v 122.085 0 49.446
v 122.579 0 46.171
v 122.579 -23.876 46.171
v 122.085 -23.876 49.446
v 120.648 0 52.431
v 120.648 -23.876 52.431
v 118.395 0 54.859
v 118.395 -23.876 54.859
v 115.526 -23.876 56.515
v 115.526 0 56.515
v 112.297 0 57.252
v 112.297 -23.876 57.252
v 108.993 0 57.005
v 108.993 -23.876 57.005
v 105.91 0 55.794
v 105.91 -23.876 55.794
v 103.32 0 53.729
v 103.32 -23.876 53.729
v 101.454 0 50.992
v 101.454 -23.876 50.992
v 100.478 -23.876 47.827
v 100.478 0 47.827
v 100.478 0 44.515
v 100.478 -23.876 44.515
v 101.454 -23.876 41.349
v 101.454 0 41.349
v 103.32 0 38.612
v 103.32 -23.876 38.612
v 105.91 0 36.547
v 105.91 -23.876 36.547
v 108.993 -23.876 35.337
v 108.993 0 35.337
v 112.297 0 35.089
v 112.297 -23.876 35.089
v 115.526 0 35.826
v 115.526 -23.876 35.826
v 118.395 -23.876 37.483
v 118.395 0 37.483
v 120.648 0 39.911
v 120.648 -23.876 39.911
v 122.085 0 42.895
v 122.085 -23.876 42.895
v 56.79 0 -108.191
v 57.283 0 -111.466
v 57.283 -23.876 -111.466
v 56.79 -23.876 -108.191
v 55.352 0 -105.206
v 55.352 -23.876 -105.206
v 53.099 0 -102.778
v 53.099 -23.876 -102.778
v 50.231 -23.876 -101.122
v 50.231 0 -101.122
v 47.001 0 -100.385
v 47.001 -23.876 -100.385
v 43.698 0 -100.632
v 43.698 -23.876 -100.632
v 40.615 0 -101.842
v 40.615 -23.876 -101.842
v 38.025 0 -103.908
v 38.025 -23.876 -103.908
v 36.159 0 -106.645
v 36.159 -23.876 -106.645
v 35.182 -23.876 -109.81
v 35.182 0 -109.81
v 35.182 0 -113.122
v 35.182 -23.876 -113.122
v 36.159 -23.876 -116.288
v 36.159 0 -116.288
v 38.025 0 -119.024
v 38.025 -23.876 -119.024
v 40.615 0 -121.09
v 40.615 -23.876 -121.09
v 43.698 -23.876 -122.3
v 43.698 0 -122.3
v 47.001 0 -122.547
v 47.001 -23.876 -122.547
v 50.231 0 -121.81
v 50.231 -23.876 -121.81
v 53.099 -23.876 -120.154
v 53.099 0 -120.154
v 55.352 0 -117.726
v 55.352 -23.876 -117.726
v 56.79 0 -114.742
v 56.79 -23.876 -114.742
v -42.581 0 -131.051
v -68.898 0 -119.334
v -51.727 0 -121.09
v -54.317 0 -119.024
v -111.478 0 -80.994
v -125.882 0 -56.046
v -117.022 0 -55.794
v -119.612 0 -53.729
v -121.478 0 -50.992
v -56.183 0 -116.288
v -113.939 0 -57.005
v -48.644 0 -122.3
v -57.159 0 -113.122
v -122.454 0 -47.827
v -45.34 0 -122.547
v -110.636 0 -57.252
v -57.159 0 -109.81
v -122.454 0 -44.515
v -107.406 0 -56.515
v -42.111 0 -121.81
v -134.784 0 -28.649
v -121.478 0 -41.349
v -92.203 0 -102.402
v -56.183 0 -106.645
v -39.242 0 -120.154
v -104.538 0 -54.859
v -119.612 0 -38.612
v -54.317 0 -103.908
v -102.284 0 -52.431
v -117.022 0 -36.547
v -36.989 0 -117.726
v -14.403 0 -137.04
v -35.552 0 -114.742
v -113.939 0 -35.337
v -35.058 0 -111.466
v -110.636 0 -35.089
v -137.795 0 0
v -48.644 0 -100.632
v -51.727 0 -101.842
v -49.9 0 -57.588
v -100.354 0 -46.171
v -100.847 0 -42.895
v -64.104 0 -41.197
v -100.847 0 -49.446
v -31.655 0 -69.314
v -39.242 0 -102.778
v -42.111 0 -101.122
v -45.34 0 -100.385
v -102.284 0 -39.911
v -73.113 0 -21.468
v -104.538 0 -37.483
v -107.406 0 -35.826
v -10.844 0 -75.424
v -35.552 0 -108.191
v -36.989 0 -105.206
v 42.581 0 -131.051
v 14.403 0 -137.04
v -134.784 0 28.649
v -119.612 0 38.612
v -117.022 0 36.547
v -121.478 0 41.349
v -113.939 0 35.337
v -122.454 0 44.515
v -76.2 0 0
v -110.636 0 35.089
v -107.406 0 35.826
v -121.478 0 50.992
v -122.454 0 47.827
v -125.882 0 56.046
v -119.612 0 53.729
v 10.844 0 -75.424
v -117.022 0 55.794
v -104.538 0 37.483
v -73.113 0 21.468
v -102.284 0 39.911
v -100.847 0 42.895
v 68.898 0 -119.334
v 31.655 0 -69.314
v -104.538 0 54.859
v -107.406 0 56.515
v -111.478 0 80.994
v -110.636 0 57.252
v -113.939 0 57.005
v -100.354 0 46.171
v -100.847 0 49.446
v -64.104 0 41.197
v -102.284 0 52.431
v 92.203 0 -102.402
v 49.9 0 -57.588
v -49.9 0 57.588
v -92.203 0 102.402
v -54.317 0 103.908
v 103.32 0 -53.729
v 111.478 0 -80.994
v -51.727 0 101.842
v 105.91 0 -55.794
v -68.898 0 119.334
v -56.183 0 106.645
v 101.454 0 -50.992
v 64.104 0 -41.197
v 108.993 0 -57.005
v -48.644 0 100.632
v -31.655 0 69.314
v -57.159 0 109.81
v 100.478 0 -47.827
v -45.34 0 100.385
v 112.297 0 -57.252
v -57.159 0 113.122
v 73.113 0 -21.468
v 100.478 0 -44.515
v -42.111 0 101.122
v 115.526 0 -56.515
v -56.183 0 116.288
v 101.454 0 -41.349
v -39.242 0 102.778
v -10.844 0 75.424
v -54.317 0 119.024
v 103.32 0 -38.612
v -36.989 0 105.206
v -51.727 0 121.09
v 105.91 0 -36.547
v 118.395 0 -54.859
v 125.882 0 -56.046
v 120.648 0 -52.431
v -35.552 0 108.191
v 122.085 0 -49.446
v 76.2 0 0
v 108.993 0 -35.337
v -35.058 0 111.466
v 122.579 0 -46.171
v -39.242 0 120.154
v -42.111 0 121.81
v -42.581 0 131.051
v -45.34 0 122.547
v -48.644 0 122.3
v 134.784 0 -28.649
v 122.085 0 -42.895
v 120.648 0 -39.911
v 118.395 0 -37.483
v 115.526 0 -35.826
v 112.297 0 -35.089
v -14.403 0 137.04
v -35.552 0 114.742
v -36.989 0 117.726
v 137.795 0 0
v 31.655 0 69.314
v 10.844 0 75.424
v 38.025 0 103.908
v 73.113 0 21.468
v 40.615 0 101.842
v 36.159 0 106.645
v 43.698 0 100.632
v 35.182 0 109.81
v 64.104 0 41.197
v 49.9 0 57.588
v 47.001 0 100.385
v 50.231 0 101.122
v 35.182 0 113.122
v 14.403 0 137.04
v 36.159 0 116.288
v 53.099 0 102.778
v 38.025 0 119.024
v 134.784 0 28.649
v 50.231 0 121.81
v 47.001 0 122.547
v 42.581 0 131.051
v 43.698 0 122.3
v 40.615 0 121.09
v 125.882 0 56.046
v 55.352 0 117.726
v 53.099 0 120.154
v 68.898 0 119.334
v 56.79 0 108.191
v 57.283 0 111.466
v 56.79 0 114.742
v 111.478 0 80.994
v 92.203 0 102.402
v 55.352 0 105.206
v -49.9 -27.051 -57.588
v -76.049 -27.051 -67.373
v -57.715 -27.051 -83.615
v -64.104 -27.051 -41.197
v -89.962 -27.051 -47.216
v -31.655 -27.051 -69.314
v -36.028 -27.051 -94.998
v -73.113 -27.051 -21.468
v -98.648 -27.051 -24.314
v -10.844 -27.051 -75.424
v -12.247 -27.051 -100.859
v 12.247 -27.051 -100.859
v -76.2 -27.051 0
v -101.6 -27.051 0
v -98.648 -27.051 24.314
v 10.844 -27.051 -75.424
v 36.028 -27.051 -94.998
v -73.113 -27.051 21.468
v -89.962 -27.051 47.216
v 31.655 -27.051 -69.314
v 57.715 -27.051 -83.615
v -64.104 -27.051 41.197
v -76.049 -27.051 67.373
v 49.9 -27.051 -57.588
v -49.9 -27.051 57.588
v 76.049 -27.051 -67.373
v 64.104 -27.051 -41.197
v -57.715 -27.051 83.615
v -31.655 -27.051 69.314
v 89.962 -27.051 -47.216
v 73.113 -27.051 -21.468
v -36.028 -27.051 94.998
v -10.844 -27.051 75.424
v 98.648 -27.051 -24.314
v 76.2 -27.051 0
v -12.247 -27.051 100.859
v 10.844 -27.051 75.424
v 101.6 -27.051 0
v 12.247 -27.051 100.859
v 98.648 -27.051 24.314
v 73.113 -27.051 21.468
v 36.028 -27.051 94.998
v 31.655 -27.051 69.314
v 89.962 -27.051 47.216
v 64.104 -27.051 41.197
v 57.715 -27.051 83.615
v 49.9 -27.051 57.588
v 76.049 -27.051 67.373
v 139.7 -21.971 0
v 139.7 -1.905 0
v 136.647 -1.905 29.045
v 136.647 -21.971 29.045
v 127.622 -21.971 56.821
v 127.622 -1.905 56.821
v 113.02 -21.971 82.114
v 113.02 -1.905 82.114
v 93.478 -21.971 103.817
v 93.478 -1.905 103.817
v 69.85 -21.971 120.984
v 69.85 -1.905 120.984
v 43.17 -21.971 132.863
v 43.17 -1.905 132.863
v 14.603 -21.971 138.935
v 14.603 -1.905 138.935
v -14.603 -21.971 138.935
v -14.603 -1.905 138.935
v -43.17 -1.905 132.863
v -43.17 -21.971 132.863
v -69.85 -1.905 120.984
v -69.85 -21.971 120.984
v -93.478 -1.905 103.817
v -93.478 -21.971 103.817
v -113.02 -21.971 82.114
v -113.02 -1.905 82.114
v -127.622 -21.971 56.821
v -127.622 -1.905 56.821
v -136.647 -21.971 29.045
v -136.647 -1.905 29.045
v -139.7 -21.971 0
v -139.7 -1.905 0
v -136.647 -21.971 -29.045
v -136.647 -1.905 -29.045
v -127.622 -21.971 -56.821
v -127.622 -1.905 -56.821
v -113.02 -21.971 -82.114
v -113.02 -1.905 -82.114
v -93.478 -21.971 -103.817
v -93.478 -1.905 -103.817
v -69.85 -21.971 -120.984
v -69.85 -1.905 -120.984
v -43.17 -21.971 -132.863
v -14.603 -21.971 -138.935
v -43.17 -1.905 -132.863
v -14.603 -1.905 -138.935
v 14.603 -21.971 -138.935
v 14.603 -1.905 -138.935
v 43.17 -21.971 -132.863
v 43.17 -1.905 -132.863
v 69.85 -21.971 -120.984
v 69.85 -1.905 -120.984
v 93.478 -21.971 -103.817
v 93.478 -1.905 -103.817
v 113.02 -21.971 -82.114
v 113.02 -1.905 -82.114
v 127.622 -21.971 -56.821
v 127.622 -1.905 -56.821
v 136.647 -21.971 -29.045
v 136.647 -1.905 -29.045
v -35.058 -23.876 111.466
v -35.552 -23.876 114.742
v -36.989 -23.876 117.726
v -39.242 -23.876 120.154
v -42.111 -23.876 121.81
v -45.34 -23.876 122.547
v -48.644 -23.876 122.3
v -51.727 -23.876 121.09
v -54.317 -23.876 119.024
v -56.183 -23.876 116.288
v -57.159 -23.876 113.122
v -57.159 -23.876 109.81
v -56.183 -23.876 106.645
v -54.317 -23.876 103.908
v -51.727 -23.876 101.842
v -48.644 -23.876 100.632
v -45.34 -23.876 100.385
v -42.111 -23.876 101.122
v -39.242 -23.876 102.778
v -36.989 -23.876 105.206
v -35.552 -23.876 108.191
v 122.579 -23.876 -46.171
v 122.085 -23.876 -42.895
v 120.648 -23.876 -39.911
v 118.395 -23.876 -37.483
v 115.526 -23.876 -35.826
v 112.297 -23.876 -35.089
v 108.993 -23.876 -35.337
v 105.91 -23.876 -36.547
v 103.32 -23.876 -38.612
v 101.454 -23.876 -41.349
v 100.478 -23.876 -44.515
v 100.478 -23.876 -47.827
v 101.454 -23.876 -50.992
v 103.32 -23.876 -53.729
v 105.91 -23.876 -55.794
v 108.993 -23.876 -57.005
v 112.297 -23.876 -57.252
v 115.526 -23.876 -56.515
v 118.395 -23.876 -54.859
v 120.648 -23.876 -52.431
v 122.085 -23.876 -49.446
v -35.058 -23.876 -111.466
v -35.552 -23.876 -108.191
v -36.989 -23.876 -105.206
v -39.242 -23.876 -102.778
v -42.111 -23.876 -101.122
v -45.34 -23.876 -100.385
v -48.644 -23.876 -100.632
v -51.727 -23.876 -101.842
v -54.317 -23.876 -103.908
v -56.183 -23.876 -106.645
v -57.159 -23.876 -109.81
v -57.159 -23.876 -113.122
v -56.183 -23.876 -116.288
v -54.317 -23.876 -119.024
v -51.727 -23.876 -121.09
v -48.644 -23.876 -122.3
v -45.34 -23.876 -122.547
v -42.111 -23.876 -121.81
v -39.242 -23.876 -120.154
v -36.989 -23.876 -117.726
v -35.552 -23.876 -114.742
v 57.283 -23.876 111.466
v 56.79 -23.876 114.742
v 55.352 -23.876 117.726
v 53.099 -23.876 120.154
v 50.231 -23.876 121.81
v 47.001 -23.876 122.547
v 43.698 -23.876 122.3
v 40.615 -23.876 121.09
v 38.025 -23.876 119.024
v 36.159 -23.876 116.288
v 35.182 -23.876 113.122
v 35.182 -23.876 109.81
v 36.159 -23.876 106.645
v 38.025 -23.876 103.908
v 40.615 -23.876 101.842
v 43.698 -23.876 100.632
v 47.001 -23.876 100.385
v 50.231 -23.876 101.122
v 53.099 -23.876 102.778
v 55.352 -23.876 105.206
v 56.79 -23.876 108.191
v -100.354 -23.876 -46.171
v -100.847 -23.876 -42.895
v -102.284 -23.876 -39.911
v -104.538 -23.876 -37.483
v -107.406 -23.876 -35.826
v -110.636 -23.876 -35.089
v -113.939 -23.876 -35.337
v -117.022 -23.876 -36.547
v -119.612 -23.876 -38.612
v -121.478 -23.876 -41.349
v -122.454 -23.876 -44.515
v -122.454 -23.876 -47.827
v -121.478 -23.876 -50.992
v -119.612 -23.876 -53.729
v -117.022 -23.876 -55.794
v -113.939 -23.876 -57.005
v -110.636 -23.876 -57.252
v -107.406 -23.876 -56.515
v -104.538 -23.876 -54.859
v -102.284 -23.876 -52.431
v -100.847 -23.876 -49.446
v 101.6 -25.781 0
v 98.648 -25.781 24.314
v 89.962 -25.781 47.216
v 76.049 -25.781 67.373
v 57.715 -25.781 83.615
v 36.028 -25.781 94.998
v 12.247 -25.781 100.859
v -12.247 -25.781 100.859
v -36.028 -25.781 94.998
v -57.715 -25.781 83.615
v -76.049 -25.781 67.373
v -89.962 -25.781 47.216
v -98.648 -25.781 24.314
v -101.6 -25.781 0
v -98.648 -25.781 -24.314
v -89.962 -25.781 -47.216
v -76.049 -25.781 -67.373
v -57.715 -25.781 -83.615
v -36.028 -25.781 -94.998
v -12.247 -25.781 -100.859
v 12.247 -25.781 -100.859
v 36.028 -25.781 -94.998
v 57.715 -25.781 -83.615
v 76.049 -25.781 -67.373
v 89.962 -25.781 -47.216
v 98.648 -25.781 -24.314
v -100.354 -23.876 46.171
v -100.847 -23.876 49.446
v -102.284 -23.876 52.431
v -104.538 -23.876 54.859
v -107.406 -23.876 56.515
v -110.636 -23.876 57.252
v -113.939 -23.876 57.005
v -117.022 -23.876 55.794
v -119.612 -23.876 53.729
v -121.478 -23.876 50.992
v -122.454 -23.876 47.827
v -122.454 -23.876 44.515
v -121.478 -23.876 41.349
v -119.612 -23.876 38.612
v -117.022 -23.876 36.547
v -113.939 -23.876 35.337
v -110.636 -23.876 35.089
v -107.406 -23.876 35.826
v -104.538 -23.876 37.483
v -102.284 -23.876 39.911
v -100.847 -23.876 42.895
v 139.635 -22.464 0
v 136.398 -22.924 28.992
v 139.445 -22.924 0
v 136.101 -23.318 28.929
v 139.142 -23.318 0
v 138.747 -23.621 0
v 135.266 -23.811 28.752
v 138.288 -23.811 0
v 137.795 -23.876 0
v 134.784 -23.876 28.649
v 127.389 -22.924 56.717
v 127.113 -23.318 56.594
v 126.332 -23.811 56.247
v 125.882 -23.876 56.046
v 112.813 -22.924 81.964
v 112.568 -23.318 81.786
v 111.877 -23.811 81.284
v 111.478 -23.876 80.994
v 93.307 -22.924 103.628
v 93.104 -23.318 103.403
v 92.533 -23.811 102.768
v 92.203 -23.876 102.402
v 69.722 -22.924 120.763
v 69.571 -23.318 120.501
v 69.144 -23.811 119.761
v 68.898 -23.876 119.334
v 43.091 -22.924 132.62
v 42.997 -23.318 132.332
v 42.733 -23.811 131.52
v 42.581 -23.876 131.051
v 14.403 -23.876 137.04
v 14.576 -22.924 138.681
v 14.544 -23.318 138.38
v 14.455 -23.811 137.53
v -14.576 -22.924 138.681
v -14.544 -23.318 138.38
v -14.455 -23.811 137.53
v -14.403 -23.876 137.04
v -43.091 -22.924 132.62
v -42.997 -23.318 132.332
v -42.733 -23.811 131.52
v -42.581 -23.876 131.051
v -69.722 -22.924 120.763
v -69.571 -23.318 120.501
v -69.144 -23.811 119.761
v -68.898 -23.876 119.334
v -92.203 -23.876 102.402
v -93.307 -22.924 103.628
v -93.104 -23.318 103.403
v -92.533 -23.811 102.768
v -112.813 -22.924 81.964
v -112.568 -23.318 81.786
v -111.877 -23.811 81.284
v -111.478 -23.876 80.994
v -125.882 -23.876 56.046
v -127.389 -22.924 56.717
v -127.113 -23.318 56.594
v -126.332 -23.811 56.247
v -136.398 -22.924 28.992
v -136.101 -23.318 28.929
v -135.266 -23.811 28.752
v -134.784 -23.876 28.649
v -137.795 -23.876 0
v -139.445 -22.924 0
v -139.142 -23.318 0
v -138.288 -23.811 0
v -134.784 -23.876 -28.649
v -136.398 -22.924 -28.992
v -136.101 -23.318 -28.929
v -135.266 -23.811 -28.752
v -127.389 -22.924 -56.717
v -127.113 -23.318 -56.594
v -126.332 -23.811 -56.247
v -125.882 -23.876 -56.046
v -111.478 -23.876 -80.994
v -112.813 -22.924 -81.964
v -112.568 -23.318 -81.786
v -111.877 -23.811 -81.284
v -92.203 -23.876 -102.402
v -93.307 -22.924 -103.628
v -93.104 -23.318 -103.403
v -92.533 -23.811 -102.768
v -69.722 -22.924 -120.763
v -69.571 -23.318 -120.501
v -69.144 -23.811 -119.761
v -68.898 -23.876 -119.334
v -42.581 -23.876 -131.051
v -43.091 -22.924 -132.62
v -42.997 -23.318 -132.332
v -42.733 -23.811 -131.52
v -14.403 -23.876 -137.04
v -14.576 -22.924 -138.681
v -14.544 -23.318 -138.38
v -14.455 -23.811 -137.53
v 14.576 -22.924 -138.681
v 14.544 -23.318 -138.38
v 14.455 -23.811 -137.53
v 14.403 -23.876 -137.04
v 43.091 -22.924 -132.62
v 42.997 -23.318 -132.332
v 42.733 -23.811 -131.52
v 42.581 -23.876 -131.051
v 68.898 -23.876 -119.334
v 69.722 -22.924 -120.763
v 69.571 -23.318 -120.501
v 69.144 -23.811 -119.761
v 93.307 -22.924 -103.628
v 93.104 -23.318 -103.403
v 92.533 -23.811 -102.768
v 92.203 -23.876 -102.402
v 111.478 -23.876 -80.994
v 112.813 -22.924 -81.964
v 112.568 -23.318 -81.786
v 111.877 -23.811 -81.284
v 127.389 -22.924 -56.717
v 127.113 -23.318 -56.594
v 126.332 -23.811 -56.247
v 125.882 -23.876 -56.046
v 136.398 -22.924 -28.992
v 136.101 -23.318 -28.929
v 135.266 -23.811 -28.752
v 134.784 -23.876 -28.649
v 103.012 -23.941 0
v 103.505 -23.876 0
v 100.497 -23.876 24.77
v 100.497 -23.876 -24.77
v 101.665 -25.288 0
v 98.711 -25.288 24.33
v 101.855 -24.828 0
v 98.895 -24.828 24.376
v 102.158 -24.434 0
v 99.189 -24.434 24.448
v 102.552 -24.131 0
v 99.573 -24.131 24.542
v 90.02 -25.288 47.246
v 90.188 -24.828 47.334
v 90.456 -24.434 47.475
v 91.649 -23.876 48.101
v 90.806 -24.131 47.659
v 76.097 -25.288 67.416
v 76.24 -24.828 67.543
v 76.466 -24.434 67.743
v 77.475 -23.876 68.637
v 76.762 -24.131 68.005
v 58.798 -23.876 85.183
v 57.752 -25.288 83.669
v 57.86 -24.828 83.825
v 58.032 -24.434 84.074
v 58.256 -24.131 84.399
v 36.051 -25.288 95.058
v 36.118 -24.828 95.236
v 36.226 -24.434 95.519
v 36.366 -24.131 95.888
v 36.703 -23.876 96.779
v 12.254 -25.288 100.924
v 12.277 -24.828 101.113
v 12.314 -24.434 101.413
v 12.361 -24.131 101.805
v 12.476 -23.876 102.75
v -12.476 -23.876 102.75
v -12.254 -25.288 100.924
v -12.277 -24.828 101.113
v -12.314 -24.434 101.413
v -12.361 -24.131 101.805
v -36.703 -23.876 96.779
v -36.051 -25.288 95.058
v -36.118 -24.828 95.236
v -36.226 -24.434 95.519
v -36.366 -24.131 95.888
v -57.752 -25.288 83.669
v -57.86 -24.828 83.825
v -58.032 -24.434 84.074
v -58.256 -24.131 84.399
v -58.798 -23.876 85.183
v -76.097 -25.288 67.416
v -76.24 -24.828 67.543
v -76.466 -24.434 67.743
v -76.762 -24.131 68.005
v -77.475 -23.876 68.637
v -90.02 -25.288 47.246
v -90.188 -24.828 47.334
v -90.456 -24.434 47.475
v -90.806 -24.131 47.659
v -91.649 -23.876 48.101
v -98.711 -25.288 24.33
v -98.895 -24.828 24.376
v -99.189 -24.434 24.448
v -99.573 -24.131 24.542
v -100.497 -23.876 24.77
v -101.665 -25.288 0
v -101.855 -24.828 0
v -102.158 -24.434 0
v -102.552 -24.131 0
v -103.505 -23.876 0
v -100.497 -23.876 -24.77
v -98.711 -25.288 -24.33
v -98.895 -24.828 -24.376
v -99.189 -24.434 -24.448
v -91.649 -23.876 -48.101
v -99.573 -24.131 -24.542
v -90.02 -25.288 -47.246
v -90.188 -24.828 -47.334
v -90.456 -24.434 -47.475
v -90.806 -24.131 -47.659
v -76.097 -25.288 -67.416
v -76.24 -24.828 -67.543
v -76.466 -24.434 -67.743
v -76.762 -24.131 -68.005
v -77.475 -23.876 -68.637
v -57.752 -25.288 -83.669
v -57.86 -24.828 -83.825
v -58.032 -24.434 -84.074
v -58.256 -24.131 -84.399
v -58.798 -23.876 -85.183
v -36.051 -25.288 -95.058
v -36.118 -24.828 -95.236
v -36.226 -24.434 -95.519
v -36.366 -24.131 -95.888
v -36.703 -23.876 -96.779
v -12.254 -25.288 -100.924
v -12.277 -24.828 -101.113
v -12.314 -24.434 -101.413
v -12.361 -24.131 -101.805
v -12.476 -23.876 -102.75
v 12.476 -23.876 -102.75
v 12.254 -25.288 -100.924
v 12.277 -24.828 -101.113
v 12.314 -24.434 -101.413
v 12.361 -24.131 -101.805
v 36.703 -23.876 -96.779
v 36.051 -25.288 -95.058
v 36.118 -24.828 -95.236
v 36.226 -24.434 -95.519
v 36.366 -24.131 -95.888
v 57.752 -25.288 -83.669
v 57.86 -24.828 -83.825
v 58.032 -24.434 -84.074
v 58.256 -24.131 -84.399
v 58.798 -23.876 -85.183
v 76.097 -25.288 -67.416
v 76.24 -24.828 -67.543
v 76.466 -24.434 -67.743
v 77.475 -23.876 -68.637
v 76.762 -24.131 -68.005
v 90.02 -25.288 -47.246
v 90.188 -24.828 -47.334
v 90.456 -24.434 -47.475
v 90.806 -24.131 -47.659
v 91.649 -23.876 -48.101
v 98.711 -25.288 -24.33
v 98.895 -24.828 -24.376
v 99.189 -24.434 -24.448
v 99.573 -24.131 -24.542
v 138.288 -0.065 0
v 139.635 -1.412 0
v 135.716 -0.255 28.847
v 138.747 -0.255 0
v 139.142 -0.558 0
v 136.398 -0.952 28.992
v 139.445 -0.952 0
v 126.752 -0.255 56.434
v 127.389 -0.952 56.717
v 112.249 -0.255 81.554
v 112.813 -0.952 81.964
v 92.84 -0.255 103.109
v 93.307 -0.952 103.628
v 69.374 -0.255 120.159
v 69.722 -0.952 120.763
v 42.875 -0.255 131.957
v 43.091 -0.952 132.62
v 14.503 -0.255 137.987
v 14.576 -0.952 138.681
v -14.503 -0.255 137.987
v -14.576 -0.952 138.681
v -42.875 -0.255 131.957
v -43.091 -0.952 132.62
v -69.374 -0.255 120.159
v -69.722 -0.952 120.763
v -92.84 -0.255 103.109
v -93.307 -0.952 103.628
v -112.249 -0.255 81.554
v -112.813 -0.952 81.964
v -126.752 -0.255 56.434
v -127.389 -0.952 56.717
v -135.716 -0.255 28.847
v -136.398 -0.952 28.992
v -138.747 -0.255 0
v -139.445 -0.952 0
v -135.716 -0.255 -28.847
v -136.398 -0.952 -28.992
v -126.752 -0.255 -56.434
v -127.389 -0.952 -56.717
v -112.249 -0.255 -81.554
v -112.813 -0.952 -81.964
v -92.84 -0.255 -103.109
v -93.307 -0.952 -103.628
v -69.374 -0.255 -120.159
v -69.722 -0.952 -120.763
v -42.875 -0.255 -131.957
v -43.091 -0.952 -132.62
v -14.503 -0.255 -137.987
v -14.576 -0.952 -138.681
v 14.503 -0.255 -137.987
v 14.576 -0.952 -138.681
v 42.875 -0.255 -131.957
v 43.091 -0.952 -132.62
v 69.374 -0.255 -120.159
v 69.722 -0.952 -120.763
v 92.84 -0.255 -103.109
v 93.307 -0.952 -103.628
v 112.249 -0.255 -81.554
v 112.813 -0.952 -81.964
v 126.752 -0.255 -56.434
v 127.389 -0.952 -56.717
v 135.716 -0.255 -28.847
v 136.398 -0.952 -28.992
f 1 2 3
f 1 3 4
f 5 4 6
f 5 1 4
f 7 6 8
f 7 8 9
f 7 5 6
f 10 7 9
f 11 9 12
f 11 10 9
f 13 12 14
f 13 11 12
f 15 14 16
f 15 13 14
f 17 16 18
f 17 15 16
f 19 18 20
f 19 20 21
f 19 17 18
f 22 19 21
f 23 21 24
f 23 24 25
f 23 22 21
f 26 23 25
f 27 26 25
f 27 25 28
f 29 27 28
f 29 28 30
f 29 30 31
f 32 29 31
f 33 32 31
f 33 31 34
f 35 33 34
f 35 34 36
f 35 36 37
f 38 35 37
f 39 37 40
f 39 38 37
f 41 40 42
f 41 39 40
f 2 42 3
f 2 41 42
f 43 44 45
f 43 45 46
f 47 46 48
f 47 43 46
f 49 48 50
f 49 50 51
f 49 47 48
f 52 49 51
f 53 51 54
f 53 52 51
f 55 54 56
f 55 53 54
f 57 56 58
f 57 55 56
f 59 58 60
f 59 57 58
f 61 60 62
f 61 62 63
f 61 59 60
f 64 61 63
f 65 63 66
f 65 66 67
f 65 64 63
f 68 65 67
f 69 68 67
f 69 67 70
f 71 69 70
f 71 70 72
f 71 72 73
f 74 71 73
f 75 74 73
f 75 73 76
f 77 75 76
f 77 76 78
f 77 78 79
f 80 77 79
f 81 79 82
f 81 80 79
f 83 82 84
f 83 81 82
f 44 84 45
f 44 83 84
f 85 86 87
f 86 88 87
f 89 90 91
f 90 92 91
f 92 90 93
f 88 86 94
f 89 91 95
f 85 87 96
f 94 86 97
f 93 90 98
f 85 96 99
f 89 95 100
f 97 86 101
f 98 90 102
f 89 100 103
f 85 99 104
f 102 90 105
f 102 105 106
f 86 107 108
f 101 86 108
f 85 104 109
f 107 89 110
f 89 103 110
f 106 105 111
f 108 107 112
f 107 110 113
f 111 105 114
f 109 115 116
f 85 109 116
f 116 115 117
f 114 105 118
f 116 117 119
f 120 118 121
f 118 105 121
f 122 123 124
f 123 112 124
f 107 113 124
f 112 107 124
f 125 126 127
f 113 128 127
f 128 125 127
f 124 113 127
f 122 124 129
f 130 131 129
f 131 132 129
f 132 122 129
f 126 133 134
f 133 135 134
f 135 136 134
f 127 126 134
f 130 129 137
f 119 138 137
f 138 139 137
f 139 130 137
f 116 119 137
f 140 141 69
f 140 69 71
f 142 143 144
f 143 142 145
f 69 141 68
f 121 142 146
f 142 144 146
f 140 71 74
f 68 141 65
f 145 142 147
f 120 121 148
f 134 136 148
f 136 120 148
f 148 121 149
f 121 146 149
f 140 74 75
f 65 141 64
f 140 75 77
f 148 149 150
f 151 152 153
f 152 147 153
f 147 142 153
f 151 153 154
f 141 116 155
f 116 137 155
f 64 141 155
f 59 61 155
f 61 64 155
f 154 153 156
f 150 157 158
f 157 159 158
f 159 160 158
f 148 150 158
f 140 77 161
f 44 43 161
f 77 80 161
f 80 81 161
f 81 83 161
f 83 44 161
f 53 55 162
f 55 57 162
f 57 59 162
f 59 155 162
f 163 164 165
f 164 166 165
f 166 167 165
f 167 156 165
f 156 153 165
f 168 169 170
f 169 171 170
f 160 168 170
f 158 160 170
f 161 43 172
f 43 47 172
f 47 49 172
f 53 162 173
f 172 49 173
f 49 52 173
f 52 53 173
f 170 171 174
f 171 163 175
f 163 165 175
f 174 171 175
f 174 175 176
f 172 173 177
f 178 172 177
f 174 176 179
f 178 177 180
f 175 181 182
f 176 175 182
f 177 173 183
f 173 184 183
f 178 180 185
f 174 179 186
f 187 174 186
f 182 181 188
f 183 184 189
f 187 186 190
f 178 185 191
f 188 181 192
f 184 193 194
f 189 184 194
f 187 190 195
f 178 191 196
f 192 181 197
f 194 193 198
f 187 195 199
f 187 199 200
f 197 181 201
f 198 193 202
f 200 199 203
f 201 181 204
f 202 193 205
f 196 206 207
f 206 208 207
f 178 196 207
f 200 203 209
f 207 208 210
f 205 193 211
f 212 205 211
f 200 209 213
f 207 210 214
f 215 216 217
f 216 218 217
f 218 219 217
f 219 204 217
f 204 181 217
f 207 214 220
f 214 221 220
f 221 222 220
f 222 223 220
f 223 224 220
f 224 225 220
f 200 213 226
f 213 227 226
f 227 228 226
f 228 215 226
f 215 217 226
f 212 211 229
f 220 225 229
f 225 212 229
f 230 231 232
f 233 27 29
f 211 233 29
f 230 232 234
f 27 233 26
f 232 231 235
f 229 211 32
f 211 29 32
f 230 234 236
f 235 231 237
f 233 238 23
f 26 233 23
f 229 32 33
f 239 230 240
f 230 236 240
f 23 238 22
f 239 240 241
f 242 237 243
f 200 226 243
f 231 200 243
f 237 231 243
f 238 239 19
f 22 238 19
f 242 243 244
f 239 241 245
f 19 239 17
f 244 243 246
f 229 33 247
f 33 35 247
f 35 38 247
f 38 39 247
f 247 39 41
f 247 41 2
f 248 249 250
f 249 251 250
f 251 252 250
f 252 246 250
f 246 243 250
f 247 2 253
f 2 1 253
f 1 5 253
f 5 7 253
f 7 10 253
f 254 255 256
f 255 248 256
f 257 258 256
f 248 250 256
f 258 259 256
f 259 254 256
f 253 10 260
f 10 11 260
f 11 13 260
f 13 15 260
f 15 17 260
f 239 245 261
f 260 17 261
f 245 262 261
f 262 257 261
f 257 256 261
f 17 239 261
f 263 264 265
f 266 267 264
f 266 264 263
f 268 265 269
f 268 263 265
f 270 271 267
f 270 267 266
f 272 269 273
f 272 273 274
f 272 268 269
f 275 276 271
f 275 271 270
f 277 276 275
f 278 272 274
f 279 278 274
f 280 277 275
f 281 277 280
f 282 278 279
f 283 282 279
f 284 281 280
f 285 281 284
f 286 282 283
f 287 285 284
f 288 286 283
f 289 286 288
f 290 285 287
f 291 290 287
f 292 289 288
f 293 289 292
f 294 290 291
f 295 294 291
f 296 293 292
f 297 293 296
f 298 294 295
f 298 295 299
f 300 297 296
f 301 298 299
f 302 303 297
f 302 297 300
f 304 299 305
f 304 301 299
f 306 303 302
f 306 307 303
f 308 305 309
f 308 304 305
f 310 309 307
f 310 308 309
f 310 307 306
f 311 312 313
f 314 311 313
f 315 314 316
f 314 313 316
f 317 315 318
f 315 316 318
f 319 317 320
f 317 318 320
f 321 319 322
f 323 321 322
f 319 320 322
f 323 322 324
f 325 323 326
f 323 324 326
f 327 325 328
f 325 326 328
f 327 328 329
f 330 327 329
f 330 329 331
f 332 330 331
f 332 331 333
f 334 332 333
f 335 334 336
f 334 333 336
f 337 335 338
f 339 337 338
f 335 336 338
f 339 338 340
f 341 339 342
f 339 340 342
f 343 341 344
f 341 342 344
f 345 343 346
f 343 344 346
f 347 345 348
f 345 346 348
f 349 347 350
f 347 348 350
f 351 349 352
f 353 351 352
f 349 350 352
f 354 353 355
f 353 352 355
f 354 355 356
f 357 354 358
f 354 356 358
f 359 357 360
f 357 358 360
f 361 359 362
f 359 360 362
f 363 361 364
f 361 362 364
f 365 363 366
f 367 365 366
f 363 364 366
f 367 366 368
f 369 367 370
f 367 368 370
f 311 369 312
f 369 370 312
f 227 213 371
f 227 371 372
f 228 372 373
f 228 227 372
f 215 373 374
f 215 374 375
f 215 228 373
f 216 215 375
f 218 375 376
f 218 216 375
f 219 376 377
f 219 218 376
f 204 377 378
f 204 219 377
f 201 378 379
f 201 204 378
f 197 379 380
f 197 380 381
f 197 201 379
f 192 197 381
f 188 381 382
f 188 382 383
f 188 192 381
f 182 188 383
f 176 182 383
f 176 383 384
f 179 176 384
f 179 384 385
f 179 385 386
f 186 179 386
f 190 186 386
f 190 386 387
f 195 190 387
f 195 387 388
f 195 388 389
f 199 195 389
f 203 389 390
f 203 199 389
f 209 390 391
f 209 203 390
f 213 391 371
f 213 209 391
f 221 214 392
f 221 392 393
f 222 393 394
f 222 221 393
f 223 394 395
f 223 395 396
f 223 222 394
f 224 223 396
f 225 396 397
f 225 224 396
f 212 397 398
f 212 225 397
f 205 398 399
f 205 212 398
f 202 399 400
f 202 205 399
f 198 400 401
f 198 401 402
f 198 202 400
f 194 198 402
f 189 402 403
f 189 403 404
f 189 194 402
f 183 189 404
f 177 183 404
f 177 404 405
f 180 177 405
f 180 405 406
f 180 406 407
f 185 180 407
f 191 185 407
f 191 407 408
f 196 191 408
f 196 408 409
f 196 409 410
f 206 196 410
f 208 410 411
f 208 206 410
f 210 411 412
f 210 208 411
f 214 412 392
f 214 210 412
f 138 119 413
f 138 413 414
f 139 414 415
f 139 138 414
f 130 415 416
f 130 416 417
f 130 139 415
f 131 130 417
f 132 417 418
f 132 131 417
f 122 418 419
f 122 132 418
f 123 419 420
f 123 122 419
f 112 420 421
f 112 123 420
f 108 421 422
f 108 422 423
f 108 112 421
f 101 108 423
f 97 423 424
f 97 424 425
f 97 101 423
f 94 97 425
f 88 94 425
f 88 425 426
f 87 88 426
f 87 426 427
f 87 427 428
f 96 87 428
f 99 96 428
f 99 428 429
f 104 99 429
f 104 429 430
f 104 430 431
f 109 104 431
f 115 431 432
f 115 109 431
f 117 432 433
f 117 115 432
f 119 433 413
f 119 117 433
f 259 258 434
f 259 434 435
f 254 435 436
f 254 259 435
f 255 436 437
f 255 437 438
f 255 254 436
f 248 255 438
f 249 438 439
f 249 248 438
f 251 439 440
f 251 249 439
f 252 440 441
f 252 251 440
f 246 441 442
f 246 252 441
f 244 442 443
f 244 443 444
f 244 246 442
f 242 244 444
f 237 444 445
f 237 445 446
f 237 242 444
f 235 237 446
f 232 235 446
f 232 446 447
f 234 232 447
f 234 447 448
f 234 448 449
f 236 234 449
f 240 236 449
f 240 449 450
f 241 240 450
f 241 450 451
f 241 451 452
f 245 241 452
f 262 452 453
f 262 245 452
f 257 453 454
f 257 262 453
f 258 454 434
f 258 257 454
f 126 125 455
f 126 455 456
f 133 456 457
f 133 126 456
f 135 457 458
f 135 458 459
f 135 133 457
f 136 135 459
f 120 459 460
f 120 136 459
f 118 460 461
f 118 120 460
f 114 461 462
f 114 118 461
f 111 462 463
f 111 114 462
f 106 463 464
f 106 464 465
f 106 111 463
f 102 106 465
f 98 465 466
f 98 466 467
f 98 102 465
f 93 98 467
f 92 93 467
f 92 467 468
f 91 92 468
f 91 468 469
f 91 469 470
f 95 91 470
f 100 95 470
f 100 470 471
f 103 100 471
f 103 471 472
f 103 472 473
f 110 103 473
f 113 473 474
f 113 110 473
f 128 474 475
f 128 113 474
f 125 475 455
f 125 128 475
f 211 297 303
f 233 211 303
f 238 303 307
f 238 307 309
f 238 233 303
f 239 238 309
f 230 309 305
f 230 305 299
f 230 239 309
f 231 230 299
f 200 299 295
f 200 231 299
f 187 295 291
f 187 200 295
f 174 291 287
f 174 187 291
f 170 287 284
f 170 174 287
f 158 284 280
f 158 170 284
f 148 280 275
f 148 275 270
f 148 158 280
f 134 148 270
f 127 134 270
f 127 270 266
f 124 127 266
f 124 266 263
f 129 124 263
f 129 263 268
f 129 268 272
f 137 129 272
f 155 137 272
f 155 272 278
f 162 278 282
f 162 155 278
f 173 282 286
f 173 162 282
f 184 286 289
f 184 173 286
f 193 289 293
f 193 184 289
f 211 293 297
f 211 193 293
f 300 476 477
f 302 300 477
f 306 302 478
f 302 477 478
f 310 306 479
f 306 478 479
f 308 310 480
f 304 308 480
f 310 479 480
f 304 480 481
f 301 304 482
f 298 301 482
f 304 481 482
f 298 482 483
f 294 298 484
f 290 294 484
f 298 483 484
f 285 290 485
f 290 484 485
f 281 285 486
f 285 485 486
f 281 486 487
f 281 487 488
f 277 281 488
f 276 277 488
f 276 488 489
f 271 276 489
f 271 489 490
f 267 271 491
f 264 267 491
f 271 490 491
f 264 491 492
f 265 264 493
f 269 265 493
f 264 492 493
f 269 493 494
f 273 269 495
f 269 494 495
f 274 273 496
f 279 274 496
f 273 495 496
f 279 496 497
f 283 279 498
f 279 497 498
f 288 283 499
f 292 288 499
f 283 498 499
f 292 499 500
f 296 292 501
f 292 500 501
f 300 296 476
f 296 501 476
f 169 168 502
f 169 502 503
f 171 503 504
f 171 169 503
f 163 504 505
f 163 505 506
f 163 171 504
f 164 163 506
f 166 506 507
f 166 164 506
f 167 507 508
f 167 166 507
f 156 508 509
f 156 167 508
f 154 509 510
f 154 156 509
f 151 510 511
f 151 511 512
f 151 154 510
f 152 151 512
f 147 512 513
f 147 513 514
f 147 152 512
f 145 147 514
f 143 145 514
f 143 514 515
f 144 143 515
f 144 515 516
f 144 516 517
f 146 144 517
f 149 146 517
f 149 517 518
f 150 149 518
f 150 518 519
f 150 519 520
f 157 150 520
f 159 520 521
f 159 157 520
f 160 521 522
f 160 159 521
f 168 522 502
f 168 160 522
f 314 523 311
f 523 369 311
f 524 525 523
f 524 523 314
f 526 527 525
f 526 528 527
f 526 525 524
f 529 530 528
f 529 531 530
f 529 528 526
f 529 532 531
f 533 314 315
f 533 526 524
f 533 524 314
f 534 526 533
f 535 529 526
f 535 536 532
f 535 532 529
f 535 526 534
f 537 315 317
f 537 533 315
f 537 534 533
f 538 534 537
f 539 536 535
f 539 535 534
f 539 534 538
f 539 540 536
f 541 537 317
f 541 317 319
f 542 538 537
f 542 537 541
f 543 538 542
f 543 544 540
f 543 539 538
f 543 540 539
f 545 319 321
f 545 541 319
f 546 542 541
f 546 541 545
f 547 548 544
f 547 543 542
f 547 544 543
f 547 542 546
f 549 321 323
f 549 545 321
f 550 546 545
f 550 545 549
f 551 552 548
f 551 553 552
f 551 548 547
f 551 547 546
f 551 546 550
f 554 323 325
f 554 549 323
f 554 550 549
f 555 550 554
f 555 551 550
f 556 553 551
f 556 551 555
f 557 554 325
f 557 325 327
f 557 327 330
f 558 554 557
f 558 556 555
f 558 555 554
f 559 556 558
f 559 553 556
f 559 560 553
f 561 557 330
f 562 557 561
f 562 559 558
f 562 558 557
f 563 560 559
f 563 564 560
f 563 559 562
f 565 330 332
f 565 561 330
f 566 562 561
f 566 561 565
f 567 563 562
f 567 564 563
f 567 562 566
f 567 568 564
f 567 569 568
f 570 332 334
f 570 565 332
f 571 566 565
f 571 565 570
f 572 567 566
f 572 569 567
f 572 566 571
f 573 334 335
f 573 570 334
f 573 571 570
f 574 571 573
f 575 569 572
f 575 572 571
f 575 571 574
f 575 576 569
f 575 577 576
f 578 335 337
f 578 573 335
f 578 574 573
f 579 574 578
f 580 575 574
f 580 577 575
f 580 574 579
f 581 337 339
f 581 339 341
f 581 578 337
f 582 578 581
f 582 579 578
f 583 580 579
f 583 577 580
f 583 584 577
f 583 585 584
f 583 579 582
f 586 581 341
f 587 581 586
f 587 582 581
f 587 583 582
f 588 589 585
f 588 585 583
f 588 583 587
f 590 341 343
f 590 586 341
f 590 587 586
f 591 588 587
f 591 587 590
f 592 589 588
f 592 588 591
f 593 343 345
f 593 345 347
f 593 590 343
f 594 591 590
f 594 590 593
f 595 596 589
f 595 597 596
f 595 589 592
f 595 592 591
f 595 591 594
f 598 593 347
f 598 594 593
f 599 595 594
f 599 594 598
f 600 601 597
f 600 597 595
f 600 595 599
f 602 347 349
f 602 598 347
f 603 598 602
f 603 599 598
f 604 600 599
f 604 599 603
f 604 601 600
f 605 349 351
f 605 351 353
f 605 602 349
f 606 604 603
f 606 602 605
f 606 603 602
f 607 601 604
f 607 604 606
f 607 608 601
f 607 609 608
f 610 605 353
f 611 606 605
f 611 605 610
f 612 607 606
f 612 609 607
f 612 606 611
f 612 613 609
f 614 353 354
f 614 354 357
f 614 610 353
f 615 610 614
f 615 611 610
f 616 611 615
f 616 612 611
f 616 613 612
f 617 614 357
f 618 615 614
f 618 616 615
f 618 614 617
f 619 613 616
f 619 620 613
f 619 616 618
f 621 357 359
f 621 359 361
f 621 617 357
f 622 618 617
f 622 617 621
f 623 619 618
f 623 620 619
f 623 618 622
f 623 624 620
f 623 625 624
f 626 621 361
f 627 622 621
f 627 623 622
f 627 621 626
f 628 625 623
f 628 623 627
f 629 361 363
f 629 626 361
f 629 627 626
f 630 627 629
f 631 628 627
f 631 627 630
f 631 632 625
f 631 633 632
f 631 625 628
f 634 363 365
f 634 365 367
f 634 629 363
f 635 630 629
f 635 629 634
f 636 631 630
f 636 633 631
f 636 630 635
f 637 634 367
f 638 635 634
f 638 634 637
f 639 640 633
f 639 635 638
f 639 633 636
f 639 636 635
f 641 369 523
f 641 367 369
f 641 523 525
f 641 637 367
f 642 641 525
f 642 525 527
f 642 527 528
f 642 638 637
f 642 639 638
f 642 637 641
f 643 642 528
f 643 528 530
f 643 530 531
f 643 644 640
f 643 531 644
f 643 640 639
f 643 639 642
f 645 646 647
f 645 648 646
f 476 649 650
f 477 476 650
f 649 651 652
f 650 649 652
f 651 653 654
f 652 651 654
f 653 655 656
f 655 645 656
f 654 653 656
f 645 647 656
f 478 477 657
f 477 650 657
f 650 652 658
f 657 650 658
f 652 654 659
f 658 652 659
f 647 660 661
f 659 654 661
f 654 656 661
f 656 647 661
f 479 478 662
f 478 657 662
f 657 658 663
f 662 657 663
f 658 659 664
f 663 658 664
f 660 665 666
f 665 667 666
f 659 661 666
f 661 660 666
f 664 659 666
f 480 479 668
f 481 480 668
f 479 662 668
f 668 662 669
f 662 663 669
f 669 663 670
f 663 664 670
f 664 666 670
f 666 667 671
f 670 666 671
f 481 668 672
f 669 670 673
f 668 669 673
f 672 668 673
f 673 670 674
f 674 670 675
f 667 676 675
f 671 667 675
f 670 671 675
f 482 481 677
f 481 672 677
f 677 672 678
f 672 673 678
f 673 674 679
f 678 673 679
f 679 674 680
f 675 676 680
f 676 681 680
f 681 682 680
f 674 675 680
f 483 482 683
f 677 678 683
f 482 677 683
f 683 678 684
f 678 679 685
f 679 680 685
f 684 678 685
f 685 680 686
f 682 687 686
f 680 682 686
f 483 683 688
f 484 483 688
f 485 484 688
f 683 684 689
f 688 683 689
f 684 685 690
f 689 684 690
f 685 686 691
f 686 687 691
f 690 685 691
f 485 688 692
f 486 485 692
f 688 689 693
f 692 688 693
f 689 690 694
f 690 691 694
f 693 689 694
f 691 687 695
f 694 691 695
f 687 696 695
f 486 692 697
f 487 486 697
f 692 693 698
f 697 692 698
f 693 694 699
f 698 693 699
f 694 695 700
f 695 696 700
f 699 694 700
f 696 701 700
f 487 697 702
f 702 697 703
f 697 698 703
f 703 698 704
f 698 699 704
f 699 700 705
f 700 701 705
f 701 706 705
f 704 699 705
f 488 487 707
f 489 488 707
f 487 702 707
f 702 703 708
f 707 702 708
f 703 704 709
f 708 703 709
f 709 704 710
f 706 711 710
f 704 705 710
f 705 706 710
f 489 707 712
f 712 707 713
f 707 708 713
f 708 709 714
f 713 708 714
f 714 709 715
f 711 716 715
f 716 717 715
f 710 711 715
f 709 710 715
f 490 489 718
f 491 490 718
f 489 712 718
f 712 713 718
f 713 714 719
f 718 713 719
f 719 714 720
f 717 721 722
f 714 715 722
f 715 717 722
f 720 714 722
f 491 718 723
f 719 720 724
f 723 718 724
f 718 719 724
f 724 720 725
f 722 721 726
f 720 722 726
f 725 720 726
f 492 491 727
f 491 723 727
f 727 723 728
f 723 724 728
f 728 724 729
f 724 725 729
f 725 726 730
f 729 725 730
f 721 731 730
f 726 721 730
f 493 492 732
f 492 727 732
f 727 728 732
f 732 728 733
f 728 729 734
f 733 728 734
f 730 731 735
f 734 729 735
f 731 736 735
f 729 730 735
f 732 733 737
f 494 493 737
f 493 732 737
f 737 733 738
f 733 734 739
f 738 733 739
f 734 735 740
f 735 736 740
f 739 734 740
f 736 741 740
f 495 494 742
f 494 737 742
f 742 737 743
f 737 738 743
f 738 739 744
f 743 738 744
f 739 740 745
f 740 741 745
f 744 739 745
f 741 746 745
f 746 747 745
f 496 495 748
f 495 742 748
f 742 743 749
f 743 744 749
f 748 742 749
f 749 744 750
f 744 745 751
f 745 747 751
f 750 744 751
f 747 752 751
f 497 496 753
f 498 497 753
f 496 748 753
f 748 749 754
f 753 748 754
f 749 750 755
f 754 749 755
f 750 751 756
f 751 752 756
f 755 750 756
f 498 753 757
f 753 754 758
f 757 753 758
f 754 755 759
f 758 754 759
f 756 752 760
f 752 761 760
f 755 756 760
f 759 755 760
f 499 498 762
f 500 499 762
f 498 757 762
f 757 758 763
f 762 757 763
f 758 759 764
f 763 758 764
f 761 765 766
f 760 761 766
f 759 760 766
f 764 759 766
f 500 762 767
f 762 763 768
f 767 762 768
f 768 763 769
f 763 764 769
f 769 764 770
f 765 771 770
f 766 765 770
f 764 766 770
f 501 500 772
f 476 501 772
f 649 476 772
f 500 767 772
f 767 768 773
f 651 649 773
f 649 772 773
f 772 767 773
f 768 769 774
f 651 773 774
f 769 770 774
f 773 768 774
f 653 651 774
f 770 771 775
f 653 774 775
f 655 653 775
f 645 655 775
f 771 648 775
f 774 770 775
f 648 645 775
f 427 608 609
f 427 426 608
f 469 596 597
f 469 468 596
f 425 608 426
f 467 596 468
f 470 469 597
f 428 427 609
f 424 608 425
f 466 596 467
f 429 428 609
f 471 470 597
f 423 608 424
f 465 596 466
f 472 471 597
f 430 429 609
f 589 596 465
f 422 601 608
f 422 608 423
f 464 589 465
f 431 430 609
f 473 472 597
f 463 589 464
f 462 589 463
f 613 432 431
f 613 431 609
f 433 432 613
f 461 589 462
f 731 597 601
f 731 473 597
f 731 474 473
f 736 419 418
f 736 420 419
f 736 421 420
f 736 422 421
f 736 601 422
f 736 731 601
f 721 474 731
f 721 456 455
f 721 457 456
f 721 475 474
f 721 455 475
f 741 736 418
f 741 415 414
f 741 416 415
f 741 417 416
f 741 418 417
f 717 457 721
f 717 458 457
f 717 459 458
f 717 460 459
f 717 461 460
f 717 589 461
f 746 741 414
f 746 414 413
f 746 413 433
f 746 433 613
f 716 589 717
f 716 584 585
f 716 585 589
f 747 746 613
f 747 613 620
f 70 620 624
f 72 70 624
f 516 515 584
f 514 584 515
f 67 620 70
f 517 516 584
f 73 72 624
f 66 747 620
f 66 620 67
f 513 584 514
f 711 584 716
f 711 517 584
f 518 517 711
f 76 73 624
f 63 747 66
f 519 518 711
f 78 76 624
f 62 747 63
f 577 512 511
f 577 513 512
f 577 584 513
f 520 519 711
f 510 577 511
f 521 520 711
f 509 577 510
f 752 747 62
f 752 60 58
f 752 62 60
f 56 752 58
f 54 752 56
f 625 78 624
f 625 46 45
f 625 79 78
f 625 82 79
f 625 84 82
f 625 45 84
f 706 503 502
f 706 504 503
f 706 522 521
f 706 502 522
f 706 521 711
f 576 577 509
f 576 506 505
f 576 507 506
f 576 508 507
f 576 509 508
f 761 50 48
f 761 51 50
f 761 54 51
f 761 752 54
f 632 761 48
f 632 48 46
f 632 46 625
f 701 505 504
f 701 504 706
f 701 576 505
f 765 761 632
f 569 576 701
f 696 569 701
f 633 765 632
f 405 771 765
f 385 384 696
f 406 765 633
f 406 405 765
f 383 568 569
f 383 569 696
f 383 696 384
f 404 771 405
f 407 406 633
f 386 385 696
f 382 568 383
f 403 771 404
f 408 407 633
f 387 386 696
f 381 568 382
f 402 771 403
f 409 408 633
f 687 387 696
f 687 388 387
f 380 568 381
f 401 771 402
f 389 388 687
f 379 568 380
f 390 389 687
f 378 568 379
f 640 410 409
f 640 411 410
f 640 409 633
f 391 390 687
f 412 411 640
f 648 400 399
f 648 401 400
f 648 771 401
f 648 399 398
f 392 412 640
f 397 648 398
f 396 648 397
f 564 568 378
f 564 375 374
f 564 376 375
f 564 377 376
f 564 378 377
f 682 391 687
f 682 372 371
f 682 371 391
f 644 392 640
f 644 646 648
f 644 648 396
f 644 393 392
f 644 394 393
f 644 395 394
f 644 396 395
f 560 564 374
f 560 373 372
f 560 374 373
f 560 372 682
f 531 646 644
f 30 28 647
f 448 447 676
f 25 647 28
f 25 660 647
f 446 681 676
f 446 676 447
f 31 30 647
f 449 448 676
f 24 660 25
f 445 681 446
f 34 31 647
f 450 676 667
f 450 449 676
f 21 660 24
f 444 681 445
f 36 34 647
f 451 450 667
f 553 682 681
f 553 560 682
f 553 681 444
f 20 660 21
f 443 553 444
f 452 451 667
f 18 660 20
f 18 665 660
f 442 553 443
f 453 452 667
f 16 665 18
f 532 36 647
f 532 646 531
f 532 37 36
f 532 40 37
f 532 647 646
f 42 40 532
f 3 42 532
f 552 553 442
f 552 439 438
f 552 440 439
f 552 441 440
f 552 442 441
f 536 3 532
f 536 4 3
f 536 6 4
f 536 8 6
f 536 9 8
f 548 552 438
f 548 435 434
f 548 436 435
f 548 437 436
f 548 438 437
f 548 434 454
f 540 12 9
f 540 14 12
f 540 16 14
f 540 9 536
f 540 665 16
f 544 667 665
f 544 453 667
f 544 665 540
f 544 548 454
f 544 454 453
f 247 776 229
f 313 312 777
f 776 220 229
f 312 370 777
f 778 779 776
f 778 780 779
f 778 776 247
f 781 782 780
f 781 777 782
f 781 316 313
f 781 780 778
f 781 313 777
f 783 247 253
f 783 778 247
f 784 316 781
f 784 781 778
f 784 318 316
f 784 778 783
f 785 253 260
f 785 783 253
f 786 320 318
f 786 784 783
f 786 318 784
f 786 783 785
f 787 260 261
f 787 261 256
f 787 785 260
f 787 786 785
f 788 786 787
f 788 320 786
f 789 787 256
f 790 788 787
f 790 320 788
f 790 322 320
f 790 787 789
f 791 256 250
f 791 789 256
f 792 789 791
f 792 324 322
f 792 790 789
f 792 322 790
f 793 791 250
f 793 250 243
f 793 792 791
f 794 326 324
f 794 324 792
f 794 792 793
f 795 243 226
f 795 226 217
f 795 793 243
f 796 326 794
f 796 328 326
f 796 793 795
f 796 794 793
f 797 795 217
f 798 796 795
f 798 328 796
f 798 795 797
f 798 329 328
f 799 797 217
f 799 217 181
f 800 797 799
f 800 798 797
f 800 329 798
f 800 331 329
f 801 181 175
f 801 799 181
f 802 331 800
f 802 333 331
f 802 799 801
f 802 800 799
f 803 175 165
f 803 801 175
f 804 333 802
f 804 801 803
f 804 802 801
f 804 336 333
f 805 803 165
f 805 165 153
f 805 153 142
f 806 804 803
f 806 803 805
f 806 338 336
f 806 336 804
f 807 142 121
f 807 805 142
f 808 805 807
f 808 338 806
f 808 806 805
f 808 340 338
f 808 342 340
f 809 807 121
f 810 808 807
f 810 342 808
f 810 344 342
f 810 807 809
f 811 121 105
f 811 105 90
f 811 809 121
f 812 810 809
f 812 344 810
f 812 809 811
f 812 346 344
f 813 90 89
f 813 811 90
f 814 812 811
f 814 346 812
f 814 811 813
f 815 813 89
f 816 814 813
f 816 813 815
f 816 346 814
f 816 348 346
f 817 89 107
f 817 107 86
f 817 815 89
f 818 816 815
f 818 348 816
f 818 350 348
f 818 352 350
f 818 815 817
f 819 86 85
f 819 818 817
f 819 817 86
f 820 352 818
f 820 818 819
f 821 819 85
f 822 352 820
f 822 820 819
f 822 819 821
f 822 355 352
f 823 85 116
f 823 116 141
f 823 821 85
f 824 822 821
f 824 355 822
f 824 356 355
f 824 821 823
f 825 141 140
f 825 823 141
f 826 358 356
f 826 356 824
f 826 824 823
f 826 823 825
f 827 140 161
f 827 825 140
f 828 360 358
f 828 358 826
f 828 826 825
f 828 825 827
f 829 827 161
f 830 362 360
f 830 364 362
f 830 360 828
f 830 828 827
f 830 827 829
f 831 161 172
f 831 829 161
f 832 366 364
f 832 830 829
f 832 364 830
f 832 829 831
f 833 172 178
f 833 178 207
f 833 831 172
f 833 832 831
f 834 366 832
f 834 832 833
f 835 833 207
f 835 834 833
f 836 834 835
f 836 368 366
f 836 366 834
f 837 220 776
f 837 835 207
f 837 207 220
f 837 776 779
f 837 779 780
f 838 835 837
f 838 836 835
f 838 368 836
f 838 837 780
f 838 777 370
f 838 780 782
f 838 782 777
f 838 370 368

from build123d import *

# Parameters (mm, degrees)
F0_R     = 139.7
F0_R_2   = 11.1125
F0_R_3   = 76.2
F1_DEPTH = 23.876
F2_R     = 101.6
F2_R_2   = 76.2
F3_DEPTH = 3.175
F4_R     = 1.905


with BuildPart() as f1:
    # F0 (on Front) → F1 (new body)
    with BuildSketch(Plane.XZ):
        Circle(F0_R)
        with Locations((-46.170756, -111.466066)):
            Circle(F0_R_2, mode=Mode.SUBTRACT)
        with Locations((-111.466066, -46.170756)):
            Circle(F0_R_2, mode=Mode.SUBTRACT)
        with Locations((46.170756, -111.466066)):
            Circle(F0_R_2, mode=Mode.SUBTRACT)
        with Locations((111.466066, -46.170756)):
            Circle(F0_R_2, mode=Mode.SUBTRACT)
        with Locations((-111.466066, 46.170756)):
            Circle(F0_R_2, mode=Mode.SUBTRACT)
        with Locations((-46.170756, 111.466066)):
            Circle(F0_R_2, mode=Mode.SUBTRACT)
        Circle(F0_R_3, mode=Mode.SUBTRACT)
        with Locations((111.466066, 46.170756)):
            Circle(F0_R_2, mode=Mode.SUBTRACT)
        with Locations((46.170756, 111.466066)):
            Circle(F0_R_2, mode=Mode.SUBTRACT)
    extrude(amount=F1_DEPTH)

    # F2 (on face) → F3 (join)
    with BuildSketch(Plane.XZ.offset(23.876)):
        Circle(F2_R)
        Circle(F2_R_2, mode=Mode.SUBTRACT)
    extrude(amount=F3_DEPTH)

    # F4
    f4_edges = [f1.edges().sort_by_distance(p)[0] for p in [
        (-139.7, 0, 0),
        (-139.7, -23.876, 0),
        (-101.6, -23.876, 0),
    ]]
    fillet(f4_edges, radius=F4_R)


solid = f1.part
